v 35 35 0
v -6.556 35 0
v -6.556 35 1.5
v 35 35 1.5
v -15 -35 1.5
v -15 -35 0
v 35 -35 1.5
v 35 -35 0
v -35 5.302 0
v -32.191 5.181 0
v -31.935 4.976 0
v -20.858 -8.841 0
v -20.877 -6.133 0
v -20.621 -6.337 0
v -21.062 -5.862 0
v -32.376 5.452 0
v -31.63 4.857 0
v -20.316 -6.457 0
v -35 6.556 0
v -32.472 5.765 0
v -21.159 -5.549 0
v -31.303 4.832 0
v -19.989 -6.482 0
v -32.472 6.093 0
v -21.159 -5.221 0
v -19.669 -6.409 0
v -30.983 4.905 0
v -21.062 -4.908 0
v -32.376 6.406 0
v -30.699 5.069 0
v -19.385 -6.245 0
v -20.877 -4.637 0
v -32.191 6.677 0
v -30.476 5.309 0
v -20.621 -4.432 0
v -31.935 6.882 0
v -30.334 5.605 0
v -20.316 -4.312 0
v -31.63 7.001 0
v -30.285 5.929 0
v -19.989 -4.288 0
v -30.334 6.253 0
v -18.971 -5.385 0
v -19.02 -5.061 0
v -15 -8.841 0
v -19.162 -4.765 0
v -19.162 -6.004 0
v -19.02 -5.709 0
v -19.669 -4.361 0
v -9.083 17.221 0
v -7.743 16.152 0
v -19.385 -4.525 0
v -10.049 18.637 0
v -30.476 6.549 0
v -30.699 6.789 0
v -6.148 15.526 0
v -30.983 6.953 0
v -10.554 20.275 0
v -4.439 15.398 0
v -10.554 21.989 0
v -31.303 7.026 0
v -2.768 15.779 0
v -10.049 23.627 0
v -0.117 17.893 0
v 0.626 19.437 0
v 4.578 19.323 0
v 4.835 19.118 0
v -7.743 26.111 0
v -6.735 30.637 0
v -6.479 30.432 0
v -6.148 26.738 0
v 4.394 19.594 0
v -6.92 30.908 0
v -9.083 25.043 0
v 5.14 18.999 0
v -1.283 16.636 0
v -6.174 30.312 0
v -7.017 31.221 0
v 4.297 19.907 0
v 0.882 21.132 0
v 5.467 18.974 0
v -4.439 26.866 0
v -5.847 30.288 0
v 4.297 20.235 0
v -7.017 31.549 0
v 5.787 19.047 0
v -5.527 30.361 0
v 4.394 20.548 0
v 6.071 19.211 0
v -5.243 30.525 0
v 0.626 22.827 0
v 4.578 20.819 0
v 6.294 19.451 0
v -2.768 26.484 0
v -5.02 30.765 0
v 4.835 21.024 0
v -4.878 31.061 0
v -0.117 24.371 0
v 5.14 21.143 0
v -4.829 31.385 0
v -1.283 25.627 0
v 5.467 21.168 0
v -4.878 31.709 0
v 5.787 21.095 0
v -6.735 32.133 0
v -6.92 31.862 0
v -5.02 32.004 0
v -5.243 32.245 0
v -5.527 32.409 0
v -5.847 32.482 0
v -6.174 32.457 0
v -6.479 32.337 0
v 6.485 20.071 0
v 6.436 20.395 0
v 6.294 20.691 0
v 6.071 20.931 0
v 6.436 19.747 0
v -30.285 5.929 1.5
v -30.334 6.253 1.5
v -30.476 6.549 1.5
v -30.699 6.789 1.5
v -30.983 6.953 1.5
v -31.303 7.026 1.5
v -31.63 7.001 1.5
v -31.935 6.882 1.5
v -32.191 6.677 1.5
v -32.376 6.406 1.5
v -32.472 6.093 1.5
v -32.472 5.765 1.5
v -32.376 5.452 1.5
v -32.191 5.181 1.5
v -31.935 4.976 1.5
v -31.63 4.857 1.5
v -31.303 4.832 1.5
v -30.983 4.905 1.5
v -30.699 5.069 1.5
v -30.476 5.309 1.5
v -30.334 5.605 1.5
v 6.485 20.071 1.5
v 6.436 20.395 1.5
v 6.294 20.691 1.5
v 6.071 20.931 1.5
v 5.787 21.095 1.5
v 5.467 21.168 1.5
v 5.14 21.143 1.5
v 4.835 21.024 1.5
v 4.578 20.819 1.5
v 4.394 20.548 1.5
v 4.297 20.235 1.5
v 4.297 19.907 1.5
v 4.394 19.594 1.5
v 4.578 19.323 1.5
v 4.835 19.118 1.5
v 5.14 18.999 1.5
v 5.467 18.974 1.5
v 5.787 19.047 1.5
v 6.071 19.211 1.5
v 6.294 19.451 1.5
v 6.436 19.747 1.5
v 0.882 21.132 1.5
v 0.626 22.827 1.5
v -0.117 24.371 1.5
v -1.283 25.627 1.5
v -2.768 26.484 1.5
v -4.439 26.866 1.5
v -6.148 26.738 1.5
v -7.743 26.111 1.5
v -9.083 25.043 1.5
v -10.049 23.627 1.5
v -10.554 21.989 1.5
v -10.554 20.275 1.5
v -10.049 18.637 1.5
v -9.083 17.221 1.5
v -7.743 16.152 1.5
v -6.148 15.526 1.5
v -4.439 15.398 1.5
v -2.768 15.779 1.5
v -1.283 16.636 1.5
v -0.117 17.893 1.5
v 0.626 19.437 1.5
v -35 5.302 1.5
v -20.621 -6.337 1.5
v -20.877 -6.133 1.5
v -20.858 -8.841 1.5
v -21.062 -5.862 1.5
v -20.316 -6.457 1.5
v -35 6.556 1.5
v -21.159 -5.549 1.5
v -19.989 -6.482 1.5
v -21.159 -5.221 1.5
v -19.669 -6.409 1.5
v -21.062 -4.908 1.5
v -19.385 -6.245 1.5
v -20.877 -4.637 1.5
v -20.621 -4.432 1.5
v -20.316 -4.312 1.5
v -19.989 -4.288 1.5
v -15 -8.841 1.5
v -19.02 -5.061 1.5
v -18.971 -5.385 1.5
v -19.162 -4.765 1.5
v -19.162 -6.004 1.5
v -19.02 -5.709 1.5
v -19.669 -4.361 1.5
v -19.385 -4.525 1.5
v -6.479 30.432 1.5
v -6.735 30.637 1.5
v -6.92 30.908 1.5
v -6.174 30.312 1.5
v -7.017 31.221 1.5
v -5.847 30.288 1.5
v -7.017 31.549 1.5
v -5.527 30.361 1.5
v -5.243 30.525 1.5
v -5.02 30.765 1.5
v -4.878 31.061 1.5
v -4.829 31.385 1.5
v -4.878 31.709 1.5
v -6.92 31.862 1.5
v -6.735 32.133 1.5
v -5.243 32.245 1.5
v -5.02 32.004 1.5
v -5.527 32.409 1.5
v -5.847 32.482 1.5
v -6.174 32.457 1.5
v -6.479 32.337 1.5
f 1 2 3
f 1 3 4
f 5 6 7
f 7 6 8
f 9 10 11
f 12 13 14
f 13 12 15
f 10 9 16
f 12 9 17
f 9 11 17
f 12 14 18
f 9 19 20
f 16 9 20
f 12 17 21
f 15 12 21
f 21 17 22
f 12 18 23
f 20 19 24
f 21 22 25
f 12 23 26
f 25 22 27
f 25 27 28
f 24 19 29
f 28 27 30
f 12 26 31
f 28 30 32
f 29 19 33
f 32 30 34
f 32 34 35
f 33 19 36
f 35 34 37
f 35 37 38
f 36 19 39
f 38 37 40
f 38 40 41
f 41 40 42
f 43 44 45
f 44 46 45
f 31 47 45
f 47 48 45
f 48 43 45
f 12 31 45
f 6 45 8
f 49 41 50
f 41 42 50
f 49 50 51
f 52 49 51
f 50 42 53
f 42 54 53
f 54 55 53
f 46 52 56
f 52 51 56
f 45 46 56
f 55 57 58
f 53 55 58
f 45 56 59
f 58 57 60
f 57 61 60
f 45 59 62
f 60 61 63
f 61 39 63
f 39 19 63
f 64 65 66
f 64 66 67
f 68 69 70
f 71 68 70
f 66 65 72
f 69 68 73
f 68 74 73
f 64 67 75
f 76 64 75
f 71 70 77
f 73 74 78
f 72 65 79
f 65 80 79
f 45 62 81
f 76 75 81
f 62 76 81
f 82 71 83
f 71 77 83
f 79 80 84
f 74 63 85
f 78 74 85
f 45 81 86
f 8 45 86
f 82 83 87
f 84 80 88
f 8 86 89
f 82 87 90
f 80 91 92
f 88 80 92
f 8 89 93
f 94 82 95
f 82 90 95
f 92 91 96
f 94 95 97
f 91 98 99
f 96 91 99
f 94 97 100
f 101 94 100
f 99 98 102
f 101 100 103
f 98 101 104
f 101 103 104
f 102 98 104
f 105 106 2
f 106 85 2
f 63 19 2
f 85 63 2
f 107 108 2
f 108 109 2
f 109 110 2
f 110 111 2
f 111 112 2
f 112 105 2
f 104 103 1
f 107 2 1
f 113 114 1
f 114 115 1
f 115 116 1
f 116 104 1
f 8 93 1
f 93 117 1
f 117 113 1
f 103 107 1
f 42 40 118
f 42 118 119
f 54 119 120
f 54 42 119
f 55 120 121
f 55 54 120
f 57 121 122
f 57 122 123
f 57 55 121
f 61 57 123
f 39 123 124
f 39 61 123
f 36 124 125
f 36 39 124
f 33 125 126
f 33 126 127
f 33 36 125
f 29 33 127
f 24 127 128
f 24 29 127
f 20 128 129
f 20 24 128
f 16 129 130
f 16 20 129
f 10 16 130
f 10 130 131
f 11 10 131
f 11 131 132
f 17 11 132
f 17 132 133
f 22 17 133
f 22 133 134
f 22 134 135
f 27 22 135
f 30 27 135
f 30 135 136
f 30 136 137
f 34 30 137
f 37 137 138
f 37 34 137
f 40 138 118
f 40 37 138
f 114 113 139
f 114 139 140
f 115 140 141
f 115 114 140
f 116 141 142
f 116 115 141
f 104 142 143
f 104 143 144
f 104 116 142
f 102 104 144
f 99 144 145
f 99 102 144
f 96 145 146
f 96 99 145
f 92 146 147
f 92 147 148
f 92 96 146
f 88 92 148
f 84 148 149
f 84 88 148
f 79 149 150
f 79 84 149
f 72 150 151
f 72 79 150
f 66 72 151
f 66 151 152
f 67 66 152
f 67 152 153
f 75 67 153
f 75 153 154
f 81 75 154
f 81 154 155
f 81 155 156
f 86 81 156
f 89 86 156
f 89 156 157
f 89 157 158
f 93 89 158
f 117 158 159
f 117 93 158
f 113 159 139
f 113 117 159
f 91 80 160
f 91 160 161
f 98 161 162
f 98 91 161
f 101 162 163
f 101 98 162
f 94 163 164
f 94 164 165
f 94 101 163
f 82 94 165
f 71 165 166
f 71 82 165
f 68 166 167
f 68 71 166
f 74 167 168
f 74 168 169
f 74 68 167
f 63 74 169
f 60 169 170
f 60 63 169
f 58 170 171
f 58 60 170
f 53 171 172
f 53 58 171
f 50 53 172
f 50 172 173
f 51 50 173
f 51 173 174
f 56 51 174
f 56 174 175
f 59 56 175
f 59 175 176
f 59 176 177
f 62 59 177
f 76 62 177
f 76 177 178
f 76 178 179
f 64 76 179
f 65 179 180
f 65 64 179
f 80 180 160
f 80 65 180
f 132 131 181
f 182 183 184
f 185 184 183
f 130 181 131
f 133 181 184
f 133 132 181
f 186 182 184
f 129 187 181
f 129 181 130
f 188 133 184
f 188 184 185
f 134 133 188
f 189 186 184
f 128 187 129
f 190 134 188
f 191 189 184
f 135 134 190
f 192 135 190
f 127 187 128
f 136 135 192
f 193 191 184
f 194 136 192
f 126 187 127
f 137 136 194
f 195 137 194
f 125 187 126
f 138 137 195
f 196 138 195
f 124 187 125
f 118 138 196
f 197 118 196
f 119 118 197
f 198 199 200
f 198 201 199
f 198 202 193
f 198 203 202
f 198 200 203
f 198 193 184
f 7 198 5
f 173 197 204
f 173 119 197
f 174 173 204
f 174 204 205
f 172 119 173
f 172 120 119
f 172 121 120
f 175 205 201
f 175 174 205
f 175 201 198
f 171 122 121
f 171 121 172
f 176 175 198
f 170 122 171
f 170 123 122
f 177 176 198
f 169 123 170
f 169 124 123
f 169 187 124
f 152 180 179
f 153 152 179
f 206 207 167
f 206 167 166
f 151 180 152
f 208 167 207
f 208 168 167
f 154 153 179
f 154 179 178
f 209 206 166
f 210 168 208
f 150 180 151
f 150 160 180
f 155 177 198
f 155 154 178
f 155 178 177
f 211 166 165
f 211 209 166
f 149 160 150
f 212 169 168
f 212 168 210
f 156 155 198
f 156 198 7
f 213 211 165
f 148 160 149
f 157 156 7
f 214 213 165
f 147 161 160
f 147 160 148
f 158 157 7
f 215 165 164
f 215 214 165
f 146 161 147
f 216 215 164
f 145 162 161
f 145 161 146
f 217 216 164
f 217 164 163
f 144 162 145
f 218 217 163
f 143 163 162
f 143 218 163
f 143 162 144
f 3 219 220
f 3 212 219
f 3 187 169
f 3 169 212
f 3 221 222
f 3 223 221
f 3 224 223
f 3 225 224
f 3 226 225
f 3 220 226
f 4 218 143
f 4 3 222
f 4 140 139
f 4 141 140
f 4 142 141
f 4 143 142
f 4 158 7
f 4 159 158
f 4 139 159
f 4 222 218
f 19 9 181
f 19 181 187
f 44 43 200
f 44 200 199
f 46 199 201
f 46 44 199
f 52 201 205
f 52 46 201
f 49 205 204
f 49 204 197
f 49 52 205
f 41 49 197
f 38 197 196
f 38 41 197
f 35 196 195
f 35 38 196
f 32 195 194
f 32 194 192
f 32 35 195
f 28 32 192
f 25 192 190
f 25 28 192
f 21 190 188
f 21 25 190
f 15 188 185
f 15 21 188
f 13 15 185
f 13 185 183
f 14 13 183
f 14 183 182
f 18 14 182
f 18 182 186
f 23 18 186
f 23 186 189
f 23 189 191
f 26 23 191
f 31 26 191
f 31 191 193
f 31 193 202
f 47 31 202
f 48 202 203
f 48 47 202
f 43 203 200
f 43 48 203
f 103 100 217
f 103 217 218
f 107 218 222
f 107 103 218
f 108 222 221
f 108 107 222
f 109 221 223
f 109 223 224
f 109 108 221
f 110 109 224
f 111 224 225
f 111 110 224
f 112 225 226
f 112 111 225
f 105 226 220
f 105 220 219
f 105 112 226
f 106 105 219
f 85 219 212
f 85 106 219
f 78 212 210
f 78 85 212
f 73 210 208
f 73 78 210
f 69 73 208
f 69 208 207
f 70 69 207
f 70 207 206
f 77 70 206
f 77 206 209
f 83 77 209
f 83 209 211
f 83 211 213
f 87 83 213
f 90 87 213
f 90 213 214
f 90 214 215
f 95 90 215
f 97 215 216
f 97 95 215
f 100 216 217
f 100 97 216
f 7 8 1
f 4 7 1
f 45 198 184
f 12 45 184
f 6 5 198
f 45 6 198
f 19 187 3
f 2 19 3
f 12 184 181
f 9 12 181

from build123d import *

# Parameters (mm, degrees)
F0_W     = 70
F0_H     = 70
F0_R     = 1.1
F0_R_2   = 5.75
F1_DEPTH = 1.5
F3_DEPTH = 1.5


with BuildPart() as f1:
    # F0 (on Top) → F1 (new body)
    with BuildSketch(Plane.XY):
        Rectangle(F0_W, F0_H)
        with Locations((-20.071068, -5.384776)):
            Circle(F0_R, mode=Mode.SUBTRACT)
        with Locations((-31.384776, 5.928932)):
            Circle(F0_R, mode=Mode.SUBTRACT)
        with Locations((-4.868272, 21.131728)):
            Circle(F0_R_2, mode=Mode.SUBTRACT)
        with Locations((-5.928932, 31.384776)):
            Circle(F0_R, mode=Mode.SUBTRACT)
        with Locations((5.384776, 20.071068)):
            Circle(F0_R, mode=Mode.SUBTRACT)
    extrude(amount=F1_DEPTH)

    # F2 (on face) → F3 (cut, through all)
    with BuildSketch(Plane.XY.offset(1.5)):
        Polygon((-35, 35), (-35, 6.556349), (-6.556349, 35), align=None)
        Polygon((-20.857864, -8.84062), (-35, 5.301515), (-35, -35), (-15, -35), (-15, -8.84062), align=None)
    extrude(amount=-F3_DEPTH, mode=Mode.SUBTRACT)


solid = f1.part
